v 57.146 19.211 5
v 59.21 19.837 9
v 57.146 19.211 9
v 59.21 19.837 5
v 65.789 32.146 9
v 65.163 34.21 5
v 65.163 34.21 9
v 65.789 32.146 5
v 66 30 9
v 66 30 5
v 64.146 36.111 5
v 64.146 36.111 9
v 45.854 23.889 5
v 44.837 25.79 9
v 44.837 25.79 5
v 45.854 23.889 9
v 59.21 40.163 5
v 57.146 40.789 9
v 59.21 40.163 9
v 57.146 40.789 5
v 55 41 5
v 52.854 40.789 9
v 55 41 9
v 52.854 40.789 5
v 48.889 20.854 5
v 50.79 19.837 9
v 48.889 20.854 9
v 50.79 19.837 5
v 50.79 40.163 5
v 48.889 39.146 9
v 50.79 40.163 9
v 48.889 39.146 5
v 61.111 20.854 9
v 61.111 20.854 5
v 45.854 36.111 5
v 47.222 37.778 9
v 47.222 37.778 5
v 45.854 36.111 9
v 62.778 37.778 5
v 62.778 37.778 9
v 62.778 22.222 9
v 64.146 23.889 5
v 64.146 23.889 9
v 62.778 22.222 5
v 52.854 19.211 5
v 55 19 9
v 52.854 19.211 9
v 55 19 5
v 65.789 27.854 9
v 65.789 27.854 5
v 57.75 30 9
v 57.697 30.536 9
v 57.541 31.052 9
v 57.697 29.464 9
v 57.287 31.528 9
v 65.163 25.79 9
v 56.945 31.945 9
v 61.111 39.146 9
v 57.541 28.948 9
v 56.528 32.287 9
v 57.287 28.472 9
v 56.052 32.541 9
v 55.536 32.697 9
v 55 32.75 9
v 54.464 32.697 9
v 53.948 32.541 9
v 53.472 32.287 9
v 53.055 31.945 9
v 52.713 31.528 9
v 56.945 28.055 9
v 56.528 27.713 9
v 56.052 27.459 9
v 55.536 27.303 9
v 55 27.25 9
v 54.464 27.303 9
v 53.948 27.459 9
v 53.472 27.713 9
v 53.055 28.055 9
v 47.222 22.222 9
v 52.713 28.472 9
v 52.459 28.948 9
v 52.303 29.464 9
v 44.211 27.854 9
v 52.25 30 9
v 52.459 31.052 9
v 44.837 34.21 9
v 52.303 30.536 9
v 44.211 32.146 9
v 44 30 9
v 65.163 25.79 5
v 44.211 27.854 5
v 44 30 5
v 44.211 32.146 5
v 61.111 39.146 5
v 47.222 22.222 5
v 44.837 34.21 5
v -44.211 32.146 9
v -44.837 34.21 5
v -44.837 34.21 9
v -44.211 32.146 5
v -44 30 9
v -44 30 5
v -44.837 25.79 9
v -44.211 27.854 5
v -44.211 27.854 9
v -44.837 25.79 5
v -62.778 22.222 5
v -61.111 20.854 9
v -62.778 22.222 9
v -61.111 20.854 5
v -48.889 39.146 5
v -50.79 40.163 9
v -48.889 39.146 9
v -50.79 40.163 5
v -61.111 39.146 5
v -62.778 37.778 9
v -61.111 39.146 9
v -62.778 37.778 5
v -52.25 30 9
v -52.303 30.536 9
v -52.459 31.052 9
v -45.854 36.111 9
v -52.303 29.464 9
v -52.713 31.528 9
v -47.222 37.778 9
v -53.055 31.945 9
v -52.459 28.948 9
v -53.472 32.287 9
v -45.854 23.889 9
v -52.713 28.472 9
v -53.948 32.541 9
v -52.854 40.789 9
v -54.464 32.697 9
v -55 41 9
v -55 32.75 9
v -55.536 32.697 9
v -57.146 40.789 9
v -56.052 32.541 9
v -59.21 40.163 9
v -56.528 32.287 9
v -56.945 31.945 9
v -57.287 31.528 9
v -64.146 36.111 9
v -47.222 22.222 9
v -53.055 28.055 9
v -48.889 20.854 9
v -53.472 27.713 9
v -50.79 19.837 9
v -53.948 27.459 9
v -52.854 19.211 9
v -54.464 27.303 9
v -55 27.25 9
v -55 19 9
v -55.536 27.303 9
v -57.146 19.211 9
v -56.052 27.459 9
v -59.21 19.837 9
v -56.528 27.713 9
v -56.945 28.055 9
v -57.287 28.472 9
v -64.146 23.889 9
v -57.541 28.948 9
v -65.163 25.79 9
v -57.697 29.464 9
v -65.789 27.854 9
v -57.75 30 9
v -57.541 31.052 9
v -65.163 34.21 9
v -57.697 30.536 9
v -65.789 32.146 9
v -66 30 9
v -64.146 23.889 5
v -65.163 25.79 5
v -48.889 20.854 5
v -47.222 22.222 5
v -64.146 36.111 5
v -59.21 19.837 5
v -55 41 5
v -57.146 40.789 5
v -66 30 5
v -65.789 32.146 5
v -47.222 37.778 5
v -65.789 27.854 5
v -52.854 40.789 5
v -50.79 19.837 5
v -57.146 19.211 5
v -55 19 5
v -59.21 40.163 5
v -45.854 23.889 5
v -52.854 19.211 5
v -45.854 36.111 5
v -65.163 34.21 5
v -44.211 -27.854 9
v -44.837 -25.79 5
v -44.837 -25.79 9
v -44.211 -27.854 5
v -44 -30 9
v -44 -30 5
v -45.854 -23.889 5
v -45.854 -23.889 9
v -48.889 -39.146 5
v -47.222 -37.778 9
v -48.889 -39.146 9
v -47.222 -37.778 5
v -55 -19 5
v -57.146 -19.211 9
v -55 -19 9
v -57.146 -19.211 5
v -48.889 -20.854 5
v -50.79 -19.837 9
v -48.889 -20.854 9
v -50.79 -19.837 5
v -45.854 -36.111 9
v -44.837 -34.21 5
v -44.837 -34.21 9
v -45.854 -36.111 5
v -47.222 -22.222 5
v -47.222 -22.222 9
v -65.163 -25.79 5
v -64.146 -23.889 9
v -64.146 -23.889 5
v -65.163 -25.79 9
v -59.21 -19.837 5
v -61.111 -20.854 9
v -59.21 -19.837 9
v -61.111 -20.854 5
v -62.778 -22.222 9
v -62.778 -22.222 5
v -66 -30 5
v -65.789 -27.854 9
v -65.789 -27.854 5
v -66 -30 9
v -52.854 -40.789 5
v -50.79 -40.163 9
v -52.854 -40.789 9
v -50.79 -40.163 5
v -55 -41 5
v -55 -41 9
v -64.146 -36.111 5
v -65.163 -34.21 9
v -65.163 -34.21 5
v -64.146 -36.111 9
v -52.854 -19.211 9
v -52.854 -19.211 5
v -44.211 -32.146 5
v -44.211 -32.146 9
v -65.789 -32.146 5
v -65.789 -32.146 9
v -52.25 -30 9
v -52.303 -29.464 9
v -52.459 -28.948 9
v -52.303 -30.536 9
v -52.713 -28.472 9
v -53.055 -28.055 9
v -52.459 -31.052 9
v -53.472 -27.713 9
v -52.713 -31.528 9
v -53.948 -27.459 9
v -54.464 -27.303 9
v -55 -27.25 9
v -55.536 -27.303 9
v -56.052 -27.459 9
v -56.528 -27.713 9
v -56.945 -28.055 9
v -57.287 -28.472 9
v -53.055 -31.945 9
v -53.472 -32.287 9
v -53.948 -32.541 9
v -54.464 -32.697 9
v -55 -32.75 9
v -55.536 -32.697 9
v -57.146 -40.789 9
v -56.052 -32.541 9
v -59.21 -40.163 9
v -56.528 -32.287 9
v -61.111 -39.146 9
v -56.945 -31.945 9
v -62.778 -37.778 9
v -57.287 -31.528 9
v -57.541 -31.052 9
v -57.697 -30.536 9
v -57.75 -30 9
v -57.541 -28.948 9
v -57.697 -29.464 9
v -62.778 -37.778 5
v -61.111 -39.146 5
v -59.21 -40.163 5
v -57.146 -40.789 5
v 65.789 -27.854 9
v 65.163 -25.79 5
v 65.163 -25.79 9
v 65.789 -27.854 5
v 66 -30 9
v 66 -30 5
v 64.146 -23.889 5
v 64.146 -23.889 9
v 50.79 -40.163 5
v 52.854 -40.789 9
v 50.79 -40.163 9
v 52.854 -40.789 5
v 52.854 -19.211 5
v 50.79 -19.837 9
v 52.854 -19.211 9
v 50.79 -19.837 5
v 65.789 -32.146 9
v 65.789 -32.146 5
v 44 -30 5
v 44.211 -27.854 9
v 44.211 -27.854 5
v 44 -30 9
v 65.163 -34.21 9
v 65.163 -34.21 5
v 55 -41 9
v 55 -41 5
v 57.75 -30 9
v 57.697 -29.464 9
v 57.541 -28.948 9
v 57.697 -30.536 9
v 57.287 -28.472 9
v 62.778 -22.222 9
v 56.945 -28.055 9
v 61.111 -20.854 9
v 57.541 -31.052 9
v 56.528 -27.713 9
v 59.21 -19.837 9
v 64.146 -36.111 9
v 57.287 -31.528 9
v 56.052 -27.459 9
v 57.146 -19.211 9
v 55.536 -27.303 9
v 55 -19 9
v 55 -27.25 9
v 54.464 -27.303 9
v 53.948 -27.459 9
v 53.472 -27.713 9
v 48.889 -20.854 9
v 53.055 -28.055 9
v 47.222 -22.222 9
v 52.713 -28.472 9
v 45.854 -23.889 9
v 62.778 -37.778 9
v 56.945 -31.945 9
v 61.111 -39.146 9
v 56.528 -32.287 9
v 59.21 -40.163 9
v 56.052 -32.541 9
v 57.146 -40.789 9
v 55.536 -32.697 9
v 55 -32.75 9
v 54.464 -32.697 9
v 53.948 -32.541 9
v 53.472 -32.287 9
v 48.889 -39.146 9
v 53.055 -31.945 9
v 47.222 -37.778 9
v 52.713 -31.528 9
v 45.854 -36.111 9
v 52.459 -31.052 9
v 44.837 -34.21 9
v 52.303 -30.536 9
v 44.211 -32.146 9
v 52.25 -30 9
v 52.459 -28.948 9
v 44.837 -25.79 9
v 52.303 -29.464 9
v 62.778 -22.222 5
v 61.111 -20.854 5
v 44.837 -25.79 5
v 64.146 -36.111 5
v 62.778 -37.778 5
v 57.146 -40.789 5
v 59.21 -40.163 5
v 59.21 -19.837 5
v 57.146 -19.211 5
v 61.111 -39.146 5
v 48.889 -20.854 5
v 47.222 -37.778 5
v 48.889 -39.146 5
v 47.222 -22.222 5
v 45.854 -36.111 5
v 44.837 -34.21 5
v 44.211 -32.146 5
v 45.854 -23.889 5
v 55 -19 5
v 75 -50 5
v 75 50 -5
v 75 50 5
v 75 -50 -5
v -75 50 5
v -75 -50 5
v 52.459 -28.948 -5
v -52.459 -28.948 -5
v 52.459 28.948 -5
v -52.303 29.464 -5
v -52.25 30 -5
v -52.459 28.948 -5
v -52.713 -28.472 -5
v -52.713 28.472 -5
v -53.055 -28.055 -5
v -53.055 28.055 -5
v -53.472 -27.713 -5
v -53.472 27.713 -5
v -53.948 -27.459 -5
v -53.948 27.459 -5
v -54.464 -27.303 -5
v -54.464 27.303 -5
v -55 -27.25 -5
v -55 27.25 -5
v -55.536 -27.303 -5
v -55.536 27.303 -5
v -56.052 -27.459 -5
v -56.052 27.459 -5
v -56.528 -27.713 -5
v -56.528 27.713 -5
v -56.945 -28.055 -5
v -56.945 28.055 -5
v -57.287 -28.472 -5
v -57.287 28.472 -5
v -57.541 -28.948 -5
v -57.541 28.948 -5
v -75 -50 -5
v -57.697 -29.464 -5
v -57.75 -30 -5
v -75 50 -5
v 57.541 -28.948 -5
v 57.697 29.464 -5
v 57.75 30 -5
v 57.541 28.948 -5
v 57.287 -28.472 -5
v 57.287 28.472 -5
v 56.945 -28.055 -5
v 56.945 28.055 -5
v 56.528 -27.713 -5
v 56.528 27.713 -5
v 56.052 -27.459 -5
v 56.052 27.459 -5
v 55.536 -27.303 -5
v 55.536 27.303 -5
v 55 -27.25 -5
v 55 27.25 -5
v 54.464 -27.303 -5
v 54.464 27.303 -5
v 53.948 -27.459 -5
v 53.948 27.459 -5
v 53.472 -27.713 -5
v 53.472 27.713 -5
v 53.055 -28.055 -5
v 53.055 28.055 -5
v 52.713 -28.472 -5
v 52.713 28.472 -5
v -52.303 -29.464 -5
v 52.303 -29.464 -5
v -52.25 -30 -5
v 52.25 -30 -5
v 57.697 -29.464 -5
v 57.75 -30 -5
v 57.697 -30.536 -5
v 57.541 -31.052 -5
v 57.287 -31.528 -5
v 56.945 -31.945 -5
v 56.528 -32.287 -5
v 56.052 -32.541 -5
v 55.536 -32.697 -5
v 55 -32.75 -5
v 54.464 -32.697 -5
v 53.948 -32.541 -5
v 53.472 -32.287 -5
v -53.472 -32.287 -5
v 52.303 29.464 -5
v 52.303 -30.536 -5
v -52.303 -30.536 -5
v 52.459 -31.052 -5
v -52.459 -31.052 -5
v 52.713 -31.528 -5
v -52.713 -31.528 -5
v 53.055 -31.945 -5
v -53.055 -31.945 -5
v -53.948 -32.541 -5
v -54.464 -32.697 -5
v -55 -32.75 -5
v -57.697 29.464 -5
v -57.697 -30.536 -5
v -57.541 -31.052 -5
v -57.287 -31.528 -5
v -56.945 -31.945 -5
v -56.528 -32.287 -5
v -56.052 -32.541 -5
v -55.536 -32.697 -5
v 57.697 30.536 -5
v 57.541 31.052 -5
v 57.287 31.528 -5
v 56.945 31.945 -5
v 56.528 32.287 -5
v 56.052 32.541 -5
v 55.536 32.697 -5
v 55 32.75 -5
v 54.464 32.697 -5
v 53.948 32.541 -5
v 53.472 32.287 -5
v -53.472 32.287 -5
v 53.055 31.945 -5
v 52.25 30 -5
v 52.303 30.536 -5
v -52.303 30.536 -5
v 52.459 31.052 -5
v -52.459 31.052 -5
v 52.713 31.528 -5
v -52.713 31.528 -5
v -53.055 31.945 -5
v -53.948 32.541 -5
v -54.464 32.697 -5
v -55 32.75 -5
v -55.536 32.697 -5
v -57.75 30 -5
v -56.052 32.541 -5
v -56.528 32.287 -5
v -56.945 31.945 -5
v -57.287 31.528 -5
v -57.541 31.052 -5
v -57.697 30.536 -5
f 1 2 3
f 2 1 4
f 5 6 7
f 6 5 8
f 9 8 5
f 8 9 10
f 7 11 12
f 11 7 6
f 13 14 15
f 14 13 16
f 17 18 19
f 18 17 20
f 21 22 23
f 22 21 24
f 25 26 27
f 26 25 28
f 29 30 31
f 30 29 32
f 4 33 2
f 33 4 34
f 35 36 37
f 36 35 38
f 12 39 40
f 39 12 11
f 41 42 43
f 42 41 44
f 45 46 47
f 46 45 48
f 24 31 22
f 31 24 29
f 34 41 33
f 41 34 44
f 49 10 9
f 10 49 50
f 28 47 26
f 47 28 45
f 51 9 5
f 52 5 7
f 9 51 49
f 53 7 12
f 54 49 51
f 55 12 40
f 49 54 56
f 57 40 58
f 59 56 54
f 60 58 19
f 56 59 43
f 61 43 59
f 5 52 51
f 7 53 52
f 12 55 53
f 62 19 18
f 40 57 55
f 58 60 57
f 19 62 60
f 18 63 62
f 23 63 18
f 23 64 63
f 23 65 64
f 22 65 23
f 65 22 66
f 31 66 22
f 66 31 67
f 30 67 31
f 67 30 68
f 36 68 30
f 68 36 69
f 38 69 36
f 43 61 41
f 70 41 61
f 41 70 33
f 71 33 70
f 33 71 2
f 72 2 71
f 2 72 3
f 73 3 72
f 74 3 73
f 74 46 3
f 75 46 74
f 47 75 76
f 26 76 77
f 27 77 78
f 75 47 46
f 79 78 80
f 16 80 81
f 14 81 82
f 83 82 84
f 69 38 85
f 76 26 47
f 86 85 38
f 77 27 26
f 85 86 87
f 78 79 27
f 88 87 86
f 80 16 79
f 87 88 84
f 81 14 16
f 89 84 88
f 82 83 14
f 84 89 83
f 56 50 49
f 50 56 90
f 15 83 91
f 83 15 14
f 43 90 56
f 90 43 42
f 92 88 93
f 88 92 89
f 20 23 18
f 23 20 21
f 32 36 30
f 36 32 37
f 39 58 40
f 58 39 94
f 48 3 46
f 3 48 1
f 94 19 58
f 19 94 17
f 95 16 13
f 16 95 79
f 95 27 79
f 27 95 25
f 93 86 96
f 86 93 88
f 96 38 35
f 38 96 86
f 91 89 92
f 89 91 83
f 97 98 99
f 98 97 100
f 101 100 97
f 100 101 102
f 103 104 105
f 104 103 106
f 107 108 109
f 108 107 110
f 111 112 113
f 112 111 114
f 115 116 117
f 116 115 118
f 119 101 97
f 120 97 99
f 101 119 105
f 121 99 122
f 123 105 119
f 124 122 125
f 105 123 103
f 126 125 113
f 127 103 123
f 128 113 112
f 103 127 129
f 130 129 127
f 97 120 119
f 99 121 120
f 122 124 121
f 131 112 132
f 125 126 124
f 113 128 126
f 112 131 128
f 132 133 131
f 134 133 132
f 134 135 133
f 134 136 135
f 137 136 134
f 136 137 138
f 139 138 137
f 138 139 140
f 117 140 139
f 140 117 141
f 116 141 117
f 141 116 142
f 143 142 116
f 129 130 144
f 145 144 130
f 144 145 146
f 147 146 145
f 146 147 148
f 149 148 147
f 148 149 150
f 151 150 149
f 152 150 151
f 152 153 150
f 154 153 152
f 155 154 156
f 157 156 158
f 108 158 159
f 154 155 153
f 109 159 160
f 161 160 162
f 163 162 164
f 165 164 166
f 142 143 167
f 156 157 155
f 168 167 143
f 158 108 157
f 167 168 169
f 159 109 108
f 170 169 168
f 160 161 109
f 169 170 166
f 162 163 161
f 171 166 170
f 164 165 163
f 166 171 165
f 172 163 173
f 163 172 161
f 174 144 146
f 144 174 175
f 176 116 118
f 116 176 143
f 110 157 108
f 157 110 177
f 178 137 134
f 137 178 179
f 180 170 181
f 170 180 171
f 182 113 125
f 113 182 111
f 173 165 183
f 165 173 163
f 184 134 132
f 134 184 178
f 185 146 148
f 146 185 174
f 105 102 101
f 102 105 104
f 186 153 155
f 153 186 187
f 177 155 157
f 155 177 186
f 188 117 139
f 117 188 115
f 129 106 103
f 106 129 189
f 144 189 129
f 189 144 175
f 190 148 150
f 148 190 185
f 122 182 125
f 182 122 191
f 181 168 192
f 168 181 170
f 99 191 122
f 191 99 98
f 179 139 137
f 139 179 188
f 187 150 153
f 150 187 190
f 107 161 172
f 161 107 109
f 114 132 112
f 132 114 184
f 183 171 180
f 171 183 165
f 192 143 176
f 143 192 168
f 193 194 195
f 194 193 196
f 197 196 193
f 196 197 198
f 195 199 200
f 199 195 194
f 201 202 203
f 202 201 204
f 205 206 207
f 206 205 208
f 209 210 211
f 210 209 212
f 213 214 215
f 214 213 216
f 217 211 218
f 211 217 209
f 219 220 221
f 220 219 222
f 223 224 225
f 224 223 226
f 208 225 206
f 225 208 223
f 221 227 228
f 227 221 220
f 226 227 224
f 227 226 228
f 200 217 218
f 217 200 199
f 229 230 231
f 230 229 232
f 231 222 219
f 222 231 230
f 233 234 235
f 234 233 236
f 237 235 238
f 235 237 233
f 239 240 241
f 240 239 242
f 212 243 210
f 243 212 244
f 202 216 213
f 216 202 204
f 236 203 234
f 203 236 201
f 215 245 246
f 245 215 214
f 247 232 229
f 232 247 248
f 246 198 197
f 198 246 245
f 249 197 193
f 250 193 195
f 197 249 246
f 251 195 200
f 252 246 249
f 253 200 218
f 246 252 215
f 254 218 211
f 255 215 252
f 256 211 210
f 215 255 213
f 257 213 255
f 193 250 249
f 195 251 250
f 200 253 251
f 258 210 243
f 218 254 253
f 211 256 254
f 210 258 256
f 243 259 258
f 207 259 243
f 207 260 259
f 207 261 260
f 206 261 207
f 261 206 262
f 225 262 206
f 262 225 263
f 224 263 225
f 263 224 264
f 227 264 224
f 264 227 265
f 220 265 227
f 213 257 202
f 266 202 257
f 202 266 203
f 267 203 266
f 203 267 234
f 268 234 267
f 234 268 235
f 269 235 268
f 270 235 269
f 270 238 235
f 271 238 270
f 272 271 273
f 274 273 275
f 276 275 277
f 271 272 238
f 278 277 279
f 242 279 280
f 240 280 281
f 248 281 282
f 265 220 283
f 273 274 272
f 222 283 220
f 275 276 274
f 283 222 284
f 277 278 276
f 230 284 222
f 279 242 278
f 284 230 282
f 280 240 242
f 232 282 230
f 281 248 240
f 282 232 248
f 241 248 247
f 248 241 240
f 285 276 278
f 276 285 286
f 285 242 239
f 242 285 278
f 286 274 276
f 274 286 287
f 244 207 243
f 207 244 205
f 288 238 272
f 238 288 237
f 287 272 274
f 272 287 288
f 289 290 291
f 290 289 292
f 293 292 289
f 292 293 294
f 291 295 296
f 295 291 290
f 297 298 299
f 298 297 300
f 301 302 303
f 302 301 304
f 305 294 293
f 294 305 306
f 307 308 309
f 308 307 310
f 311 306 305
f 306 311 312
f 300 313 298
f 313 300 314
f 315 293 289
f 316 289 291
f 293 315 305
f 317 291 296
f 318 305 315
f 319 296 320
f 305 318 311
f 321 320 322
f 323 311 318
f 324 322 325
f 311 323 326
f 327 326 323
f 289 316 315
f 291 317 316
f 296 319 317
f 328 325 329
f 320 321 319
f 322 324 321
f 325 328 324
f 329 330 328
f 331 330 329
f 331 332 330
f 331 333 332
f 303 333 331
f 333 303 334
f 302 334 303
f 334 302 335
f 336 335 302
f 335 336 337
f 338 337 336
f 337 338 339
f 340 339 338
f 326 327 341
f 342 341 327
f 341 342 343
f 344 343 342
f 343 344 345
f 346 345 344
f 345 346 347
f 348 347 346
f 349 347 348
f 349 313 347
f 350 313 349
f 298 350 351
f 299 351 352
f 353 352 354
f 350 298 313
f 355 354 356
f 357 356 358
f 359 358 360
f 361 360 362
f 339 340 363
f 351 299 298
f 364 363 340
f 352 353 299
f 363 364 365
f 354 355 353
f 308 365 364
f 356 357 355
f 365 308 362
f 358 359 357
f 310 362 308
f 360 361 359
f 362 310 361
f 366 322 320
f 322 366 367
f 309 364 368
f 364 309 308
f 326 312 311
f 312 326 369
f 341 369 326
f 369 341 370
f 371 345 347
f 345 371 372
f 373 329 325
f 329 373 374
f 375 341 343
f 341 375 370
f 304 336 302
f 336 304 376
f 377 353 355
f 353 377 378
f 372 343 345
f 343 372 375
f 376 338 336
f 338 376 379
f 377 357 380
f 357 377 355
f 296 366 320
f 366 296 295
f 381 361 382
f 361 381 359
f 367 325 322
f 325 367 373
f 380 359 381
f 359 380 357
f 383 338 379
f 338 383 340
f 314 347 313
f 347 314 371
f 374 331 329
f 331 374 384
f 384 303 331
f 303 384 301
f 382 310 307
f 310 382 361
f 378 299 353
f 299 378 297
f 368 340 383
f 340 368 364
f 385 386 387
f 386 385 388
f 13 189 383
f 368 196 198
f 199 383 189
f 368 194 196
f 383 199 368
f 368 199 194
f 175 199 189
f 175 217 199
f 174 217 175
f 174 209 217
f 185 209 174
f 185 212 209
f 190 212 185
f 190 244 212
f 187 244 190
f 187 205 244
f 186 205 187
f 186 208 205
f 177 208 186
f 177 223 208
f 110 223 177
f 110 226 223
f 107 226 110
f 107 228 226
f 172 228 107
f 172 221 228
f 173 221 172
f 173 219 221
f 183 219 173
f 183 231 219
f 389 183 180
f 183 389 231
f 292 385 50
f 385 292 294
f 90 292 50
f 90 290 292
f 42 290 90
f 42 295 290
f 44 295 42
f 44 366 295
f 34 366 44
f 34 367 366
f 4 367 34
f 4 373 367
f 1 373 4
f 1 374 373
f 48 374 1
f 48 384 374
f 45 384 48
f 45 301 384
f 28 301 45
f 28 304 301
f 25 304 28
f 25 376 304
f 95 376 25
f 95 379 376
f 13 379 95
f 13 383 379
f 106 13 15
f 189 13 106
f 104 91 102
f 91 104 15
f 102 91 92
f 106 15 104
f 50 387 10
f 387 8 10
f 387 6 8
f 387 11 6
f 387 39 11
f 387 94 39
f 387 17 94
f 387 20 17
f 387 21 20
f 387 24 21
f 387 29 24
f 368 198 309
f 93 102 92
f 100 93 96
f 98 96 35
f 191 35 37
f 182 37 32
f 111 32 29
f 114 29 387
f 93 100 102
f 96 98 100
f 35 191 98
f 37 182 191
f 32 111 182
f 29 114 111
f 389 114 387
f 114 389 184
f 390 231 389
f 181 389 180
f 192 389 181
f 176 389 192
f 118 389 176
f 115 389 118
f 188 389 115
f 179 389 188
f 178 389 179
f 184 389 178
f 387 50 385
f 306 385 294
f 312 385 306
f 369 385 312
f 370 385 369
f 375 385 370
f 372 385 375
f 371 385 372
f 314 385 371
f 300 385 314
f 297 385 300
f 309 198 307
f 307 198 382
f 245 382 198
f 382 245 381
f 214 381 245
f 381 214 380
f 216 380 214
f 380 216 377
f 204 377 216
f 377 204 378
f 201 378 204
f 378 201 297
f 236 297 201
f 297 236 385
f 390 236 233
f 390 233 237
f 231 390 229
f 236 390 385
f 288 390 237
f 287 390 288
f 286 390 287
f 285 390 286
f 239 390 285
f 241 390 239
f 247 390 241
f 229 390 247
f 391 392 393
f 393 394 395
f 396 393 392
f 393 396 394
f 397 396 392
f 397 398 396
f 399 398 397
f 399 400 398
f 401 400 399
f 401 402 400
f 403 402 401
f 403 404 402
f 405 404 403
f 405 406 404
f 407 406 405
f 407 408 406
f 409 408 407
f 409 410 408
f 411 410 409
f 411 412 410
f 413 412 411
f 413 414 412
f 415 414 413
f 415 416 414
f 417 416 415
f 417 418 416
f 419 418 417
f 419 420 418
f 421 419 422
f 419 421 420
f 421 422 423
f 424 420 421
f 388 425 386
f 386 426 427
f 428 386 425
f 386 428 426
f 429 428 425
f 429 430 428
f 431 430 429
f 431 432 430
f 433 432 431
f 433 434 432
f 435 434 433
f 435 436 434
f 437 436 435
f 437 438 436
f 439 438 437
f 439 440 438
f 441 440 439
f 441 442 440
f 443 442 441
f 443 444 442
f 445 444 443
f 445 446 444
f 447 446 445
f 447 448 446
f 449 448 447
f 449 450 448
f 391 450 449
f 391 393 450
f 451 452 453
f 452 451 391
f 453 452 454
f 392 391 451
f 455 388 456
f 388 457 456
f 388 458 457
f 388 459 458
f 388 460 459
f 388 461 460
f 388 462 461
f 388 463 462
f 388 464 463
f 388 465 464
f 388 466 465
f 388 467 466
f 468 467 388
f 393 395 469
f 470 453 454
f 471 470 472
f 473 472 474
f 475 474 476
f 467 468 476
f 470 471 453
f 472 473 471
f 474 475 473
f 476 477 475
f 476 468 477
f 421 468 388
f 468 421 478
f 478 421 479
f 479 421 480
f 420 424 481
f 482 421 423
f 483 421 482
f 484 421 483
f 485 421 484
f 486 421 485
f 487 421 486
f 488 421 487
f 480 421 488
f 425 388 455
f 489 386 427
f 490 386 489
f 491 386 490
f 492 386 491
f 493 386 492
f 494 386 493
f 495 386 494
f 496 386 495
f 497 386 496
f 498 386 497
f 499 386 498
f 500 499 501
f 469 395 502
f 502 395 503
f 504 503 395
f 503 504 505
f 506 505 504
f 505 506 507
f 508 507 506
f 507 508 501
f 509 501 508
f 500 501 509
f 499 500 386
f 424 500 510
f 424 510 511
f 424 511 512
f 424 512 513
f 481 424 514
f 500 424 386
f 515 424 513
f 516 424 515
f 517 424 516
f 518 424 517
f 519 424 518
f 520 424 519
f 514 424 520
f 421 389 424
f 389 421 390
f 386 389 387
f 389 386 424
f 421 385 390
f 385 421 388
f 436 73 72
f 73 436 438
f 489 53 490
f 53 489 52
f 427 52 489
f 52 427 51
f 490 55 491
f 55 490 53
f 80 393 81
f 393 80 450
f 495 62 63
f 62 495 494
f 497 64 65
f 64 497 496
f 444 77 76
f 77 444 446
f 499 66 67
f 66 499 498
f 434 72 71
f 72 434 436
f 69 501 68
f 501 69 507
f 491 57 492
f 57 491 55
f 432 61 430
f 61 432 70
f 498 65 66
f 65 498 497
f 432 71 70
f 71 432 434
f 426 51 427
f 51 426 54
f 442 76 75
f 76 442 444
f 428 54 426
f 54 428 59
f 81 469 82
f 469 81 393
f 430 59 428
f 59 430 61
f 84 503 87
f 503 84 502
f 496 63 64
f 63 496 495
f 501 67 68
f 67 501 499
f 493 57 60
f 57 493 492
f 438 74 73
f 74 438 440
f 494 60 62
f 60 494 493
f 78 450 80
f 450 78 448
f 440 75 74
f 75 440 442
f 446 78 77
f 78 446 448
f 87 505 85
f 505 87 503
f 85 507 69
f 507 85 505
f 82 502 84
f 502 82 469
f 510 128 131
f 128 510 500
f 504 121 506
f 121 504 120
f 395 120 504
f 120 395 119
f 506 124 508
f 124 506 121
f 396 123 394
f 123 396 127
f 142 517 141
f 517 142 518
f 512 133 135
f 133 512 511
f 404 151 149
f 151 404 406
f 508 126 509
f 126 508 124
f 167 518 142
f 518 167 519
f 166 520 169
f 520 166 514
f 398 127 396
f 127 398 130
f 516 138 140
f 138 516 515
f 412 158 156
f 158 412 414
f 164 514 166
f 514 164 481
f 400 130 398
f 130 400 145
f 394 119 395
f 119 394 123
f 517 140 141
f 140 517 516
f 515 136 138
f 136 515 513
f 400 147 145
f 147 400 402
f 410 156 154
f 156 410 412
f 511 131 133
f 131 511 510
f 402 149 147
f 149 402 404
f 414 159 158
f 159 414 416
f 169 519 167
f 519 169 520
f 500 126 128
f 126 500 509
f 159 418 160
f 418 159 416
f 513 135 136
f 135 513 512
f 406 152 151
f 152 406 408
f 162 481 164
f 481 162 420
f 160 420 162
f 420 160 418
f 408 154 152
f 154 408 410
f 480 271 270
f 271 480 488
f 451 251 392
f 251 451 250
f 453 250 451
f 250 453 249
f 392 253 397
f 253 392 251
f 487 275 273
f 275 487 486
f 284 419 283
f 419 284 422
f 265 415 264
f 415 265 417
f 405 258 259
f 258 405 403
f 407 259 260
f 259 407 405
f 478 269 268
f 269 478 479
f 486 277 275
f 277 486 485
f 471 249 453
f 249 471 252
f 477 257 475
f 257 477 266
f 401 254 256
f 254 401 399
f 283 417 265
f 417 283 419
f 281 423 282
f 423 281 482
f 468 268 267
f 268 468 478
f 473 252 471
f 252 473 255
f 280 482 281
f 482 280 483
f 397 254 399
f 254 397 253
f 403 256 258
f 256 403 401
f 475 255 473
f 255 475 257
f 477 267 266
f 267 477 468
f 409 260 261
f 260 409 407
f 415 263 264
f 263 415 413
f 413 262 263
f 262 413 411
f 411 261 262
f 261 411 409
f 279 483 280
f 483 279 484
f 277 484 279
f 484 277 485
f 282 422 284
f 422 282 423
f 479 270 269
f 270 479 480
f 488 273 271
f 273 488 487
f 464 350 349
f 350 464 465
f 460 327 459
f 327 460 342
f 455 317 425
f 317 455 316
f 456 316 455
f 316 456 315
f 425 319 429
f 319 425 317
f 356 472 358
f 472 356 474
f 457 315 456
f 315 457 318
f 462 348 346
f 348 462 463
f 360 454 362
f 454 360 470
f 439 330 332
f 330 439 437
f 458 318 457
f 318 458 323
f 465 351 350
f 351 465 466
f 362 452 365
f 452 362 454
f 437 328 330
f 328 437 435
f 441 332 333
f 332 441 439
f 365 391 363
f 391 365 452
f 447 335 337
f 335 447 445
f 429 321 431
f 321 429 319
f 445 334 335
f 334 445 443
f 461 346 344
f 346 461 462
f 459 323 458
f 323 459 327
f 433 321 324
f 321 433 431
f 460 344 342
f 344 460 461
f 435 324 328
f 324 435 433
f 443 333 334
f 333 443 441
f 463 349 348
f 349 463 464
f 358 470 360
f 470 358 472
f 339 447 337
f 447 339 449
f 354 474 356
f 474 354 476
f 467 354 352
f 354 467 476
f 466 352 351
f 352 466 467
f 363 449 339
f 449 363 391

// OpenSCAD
$fn = 32;

// ----------------------------------------------------------------------
// Anchor pads 150 x 100 x 14
// four corner bosses with anchor holes
// ----------------------------------------------------------------------

// --- parameters (mm) ---
plate = [150, 100, 10];  // base plate size (x, y, z)
pads = 4;                // boss count, one per corner
edge = 20;               // boss centre offset from the plate edge
boss_d = 22;             // boss diameter
boss_h = 4;              // boss height above the base plate
hole_d = 5.5;            // hole diameter

// --- derived feature positions (mm) ---
height = plate[2] + boss_h;      // = 14   overall height of the part
corner_x = plate[0] / 2 - edge;  // = 55   boss centre X
corner_y = plate[1] / 2 - edge;  // = 30   boss centre Y
feature_centers = [
  [corner_x, corner_y],
  [-corner_x, corner_y],
  [-corner_x, -corner_y],
  [corner_x, -corner_y]
];   // boss centres, anchor holes are drilled there

// base plate, four bosses standing on it, anchor holes all the way through
difference() {
  union() {
    cube(plate, center = true);
    for (centre = feature_centers)
      translate([centre[0], centre[1], plate[2] / 2 - 1])
        cylinder(d = boss_d, h = boss_h + 1);
  }
  for (centre = feature_centers)
    translate([centre[0], centre[1], -height])
      cylinder(d = hole_d, h = 2 * height + 2);  // through boss and plate
}
